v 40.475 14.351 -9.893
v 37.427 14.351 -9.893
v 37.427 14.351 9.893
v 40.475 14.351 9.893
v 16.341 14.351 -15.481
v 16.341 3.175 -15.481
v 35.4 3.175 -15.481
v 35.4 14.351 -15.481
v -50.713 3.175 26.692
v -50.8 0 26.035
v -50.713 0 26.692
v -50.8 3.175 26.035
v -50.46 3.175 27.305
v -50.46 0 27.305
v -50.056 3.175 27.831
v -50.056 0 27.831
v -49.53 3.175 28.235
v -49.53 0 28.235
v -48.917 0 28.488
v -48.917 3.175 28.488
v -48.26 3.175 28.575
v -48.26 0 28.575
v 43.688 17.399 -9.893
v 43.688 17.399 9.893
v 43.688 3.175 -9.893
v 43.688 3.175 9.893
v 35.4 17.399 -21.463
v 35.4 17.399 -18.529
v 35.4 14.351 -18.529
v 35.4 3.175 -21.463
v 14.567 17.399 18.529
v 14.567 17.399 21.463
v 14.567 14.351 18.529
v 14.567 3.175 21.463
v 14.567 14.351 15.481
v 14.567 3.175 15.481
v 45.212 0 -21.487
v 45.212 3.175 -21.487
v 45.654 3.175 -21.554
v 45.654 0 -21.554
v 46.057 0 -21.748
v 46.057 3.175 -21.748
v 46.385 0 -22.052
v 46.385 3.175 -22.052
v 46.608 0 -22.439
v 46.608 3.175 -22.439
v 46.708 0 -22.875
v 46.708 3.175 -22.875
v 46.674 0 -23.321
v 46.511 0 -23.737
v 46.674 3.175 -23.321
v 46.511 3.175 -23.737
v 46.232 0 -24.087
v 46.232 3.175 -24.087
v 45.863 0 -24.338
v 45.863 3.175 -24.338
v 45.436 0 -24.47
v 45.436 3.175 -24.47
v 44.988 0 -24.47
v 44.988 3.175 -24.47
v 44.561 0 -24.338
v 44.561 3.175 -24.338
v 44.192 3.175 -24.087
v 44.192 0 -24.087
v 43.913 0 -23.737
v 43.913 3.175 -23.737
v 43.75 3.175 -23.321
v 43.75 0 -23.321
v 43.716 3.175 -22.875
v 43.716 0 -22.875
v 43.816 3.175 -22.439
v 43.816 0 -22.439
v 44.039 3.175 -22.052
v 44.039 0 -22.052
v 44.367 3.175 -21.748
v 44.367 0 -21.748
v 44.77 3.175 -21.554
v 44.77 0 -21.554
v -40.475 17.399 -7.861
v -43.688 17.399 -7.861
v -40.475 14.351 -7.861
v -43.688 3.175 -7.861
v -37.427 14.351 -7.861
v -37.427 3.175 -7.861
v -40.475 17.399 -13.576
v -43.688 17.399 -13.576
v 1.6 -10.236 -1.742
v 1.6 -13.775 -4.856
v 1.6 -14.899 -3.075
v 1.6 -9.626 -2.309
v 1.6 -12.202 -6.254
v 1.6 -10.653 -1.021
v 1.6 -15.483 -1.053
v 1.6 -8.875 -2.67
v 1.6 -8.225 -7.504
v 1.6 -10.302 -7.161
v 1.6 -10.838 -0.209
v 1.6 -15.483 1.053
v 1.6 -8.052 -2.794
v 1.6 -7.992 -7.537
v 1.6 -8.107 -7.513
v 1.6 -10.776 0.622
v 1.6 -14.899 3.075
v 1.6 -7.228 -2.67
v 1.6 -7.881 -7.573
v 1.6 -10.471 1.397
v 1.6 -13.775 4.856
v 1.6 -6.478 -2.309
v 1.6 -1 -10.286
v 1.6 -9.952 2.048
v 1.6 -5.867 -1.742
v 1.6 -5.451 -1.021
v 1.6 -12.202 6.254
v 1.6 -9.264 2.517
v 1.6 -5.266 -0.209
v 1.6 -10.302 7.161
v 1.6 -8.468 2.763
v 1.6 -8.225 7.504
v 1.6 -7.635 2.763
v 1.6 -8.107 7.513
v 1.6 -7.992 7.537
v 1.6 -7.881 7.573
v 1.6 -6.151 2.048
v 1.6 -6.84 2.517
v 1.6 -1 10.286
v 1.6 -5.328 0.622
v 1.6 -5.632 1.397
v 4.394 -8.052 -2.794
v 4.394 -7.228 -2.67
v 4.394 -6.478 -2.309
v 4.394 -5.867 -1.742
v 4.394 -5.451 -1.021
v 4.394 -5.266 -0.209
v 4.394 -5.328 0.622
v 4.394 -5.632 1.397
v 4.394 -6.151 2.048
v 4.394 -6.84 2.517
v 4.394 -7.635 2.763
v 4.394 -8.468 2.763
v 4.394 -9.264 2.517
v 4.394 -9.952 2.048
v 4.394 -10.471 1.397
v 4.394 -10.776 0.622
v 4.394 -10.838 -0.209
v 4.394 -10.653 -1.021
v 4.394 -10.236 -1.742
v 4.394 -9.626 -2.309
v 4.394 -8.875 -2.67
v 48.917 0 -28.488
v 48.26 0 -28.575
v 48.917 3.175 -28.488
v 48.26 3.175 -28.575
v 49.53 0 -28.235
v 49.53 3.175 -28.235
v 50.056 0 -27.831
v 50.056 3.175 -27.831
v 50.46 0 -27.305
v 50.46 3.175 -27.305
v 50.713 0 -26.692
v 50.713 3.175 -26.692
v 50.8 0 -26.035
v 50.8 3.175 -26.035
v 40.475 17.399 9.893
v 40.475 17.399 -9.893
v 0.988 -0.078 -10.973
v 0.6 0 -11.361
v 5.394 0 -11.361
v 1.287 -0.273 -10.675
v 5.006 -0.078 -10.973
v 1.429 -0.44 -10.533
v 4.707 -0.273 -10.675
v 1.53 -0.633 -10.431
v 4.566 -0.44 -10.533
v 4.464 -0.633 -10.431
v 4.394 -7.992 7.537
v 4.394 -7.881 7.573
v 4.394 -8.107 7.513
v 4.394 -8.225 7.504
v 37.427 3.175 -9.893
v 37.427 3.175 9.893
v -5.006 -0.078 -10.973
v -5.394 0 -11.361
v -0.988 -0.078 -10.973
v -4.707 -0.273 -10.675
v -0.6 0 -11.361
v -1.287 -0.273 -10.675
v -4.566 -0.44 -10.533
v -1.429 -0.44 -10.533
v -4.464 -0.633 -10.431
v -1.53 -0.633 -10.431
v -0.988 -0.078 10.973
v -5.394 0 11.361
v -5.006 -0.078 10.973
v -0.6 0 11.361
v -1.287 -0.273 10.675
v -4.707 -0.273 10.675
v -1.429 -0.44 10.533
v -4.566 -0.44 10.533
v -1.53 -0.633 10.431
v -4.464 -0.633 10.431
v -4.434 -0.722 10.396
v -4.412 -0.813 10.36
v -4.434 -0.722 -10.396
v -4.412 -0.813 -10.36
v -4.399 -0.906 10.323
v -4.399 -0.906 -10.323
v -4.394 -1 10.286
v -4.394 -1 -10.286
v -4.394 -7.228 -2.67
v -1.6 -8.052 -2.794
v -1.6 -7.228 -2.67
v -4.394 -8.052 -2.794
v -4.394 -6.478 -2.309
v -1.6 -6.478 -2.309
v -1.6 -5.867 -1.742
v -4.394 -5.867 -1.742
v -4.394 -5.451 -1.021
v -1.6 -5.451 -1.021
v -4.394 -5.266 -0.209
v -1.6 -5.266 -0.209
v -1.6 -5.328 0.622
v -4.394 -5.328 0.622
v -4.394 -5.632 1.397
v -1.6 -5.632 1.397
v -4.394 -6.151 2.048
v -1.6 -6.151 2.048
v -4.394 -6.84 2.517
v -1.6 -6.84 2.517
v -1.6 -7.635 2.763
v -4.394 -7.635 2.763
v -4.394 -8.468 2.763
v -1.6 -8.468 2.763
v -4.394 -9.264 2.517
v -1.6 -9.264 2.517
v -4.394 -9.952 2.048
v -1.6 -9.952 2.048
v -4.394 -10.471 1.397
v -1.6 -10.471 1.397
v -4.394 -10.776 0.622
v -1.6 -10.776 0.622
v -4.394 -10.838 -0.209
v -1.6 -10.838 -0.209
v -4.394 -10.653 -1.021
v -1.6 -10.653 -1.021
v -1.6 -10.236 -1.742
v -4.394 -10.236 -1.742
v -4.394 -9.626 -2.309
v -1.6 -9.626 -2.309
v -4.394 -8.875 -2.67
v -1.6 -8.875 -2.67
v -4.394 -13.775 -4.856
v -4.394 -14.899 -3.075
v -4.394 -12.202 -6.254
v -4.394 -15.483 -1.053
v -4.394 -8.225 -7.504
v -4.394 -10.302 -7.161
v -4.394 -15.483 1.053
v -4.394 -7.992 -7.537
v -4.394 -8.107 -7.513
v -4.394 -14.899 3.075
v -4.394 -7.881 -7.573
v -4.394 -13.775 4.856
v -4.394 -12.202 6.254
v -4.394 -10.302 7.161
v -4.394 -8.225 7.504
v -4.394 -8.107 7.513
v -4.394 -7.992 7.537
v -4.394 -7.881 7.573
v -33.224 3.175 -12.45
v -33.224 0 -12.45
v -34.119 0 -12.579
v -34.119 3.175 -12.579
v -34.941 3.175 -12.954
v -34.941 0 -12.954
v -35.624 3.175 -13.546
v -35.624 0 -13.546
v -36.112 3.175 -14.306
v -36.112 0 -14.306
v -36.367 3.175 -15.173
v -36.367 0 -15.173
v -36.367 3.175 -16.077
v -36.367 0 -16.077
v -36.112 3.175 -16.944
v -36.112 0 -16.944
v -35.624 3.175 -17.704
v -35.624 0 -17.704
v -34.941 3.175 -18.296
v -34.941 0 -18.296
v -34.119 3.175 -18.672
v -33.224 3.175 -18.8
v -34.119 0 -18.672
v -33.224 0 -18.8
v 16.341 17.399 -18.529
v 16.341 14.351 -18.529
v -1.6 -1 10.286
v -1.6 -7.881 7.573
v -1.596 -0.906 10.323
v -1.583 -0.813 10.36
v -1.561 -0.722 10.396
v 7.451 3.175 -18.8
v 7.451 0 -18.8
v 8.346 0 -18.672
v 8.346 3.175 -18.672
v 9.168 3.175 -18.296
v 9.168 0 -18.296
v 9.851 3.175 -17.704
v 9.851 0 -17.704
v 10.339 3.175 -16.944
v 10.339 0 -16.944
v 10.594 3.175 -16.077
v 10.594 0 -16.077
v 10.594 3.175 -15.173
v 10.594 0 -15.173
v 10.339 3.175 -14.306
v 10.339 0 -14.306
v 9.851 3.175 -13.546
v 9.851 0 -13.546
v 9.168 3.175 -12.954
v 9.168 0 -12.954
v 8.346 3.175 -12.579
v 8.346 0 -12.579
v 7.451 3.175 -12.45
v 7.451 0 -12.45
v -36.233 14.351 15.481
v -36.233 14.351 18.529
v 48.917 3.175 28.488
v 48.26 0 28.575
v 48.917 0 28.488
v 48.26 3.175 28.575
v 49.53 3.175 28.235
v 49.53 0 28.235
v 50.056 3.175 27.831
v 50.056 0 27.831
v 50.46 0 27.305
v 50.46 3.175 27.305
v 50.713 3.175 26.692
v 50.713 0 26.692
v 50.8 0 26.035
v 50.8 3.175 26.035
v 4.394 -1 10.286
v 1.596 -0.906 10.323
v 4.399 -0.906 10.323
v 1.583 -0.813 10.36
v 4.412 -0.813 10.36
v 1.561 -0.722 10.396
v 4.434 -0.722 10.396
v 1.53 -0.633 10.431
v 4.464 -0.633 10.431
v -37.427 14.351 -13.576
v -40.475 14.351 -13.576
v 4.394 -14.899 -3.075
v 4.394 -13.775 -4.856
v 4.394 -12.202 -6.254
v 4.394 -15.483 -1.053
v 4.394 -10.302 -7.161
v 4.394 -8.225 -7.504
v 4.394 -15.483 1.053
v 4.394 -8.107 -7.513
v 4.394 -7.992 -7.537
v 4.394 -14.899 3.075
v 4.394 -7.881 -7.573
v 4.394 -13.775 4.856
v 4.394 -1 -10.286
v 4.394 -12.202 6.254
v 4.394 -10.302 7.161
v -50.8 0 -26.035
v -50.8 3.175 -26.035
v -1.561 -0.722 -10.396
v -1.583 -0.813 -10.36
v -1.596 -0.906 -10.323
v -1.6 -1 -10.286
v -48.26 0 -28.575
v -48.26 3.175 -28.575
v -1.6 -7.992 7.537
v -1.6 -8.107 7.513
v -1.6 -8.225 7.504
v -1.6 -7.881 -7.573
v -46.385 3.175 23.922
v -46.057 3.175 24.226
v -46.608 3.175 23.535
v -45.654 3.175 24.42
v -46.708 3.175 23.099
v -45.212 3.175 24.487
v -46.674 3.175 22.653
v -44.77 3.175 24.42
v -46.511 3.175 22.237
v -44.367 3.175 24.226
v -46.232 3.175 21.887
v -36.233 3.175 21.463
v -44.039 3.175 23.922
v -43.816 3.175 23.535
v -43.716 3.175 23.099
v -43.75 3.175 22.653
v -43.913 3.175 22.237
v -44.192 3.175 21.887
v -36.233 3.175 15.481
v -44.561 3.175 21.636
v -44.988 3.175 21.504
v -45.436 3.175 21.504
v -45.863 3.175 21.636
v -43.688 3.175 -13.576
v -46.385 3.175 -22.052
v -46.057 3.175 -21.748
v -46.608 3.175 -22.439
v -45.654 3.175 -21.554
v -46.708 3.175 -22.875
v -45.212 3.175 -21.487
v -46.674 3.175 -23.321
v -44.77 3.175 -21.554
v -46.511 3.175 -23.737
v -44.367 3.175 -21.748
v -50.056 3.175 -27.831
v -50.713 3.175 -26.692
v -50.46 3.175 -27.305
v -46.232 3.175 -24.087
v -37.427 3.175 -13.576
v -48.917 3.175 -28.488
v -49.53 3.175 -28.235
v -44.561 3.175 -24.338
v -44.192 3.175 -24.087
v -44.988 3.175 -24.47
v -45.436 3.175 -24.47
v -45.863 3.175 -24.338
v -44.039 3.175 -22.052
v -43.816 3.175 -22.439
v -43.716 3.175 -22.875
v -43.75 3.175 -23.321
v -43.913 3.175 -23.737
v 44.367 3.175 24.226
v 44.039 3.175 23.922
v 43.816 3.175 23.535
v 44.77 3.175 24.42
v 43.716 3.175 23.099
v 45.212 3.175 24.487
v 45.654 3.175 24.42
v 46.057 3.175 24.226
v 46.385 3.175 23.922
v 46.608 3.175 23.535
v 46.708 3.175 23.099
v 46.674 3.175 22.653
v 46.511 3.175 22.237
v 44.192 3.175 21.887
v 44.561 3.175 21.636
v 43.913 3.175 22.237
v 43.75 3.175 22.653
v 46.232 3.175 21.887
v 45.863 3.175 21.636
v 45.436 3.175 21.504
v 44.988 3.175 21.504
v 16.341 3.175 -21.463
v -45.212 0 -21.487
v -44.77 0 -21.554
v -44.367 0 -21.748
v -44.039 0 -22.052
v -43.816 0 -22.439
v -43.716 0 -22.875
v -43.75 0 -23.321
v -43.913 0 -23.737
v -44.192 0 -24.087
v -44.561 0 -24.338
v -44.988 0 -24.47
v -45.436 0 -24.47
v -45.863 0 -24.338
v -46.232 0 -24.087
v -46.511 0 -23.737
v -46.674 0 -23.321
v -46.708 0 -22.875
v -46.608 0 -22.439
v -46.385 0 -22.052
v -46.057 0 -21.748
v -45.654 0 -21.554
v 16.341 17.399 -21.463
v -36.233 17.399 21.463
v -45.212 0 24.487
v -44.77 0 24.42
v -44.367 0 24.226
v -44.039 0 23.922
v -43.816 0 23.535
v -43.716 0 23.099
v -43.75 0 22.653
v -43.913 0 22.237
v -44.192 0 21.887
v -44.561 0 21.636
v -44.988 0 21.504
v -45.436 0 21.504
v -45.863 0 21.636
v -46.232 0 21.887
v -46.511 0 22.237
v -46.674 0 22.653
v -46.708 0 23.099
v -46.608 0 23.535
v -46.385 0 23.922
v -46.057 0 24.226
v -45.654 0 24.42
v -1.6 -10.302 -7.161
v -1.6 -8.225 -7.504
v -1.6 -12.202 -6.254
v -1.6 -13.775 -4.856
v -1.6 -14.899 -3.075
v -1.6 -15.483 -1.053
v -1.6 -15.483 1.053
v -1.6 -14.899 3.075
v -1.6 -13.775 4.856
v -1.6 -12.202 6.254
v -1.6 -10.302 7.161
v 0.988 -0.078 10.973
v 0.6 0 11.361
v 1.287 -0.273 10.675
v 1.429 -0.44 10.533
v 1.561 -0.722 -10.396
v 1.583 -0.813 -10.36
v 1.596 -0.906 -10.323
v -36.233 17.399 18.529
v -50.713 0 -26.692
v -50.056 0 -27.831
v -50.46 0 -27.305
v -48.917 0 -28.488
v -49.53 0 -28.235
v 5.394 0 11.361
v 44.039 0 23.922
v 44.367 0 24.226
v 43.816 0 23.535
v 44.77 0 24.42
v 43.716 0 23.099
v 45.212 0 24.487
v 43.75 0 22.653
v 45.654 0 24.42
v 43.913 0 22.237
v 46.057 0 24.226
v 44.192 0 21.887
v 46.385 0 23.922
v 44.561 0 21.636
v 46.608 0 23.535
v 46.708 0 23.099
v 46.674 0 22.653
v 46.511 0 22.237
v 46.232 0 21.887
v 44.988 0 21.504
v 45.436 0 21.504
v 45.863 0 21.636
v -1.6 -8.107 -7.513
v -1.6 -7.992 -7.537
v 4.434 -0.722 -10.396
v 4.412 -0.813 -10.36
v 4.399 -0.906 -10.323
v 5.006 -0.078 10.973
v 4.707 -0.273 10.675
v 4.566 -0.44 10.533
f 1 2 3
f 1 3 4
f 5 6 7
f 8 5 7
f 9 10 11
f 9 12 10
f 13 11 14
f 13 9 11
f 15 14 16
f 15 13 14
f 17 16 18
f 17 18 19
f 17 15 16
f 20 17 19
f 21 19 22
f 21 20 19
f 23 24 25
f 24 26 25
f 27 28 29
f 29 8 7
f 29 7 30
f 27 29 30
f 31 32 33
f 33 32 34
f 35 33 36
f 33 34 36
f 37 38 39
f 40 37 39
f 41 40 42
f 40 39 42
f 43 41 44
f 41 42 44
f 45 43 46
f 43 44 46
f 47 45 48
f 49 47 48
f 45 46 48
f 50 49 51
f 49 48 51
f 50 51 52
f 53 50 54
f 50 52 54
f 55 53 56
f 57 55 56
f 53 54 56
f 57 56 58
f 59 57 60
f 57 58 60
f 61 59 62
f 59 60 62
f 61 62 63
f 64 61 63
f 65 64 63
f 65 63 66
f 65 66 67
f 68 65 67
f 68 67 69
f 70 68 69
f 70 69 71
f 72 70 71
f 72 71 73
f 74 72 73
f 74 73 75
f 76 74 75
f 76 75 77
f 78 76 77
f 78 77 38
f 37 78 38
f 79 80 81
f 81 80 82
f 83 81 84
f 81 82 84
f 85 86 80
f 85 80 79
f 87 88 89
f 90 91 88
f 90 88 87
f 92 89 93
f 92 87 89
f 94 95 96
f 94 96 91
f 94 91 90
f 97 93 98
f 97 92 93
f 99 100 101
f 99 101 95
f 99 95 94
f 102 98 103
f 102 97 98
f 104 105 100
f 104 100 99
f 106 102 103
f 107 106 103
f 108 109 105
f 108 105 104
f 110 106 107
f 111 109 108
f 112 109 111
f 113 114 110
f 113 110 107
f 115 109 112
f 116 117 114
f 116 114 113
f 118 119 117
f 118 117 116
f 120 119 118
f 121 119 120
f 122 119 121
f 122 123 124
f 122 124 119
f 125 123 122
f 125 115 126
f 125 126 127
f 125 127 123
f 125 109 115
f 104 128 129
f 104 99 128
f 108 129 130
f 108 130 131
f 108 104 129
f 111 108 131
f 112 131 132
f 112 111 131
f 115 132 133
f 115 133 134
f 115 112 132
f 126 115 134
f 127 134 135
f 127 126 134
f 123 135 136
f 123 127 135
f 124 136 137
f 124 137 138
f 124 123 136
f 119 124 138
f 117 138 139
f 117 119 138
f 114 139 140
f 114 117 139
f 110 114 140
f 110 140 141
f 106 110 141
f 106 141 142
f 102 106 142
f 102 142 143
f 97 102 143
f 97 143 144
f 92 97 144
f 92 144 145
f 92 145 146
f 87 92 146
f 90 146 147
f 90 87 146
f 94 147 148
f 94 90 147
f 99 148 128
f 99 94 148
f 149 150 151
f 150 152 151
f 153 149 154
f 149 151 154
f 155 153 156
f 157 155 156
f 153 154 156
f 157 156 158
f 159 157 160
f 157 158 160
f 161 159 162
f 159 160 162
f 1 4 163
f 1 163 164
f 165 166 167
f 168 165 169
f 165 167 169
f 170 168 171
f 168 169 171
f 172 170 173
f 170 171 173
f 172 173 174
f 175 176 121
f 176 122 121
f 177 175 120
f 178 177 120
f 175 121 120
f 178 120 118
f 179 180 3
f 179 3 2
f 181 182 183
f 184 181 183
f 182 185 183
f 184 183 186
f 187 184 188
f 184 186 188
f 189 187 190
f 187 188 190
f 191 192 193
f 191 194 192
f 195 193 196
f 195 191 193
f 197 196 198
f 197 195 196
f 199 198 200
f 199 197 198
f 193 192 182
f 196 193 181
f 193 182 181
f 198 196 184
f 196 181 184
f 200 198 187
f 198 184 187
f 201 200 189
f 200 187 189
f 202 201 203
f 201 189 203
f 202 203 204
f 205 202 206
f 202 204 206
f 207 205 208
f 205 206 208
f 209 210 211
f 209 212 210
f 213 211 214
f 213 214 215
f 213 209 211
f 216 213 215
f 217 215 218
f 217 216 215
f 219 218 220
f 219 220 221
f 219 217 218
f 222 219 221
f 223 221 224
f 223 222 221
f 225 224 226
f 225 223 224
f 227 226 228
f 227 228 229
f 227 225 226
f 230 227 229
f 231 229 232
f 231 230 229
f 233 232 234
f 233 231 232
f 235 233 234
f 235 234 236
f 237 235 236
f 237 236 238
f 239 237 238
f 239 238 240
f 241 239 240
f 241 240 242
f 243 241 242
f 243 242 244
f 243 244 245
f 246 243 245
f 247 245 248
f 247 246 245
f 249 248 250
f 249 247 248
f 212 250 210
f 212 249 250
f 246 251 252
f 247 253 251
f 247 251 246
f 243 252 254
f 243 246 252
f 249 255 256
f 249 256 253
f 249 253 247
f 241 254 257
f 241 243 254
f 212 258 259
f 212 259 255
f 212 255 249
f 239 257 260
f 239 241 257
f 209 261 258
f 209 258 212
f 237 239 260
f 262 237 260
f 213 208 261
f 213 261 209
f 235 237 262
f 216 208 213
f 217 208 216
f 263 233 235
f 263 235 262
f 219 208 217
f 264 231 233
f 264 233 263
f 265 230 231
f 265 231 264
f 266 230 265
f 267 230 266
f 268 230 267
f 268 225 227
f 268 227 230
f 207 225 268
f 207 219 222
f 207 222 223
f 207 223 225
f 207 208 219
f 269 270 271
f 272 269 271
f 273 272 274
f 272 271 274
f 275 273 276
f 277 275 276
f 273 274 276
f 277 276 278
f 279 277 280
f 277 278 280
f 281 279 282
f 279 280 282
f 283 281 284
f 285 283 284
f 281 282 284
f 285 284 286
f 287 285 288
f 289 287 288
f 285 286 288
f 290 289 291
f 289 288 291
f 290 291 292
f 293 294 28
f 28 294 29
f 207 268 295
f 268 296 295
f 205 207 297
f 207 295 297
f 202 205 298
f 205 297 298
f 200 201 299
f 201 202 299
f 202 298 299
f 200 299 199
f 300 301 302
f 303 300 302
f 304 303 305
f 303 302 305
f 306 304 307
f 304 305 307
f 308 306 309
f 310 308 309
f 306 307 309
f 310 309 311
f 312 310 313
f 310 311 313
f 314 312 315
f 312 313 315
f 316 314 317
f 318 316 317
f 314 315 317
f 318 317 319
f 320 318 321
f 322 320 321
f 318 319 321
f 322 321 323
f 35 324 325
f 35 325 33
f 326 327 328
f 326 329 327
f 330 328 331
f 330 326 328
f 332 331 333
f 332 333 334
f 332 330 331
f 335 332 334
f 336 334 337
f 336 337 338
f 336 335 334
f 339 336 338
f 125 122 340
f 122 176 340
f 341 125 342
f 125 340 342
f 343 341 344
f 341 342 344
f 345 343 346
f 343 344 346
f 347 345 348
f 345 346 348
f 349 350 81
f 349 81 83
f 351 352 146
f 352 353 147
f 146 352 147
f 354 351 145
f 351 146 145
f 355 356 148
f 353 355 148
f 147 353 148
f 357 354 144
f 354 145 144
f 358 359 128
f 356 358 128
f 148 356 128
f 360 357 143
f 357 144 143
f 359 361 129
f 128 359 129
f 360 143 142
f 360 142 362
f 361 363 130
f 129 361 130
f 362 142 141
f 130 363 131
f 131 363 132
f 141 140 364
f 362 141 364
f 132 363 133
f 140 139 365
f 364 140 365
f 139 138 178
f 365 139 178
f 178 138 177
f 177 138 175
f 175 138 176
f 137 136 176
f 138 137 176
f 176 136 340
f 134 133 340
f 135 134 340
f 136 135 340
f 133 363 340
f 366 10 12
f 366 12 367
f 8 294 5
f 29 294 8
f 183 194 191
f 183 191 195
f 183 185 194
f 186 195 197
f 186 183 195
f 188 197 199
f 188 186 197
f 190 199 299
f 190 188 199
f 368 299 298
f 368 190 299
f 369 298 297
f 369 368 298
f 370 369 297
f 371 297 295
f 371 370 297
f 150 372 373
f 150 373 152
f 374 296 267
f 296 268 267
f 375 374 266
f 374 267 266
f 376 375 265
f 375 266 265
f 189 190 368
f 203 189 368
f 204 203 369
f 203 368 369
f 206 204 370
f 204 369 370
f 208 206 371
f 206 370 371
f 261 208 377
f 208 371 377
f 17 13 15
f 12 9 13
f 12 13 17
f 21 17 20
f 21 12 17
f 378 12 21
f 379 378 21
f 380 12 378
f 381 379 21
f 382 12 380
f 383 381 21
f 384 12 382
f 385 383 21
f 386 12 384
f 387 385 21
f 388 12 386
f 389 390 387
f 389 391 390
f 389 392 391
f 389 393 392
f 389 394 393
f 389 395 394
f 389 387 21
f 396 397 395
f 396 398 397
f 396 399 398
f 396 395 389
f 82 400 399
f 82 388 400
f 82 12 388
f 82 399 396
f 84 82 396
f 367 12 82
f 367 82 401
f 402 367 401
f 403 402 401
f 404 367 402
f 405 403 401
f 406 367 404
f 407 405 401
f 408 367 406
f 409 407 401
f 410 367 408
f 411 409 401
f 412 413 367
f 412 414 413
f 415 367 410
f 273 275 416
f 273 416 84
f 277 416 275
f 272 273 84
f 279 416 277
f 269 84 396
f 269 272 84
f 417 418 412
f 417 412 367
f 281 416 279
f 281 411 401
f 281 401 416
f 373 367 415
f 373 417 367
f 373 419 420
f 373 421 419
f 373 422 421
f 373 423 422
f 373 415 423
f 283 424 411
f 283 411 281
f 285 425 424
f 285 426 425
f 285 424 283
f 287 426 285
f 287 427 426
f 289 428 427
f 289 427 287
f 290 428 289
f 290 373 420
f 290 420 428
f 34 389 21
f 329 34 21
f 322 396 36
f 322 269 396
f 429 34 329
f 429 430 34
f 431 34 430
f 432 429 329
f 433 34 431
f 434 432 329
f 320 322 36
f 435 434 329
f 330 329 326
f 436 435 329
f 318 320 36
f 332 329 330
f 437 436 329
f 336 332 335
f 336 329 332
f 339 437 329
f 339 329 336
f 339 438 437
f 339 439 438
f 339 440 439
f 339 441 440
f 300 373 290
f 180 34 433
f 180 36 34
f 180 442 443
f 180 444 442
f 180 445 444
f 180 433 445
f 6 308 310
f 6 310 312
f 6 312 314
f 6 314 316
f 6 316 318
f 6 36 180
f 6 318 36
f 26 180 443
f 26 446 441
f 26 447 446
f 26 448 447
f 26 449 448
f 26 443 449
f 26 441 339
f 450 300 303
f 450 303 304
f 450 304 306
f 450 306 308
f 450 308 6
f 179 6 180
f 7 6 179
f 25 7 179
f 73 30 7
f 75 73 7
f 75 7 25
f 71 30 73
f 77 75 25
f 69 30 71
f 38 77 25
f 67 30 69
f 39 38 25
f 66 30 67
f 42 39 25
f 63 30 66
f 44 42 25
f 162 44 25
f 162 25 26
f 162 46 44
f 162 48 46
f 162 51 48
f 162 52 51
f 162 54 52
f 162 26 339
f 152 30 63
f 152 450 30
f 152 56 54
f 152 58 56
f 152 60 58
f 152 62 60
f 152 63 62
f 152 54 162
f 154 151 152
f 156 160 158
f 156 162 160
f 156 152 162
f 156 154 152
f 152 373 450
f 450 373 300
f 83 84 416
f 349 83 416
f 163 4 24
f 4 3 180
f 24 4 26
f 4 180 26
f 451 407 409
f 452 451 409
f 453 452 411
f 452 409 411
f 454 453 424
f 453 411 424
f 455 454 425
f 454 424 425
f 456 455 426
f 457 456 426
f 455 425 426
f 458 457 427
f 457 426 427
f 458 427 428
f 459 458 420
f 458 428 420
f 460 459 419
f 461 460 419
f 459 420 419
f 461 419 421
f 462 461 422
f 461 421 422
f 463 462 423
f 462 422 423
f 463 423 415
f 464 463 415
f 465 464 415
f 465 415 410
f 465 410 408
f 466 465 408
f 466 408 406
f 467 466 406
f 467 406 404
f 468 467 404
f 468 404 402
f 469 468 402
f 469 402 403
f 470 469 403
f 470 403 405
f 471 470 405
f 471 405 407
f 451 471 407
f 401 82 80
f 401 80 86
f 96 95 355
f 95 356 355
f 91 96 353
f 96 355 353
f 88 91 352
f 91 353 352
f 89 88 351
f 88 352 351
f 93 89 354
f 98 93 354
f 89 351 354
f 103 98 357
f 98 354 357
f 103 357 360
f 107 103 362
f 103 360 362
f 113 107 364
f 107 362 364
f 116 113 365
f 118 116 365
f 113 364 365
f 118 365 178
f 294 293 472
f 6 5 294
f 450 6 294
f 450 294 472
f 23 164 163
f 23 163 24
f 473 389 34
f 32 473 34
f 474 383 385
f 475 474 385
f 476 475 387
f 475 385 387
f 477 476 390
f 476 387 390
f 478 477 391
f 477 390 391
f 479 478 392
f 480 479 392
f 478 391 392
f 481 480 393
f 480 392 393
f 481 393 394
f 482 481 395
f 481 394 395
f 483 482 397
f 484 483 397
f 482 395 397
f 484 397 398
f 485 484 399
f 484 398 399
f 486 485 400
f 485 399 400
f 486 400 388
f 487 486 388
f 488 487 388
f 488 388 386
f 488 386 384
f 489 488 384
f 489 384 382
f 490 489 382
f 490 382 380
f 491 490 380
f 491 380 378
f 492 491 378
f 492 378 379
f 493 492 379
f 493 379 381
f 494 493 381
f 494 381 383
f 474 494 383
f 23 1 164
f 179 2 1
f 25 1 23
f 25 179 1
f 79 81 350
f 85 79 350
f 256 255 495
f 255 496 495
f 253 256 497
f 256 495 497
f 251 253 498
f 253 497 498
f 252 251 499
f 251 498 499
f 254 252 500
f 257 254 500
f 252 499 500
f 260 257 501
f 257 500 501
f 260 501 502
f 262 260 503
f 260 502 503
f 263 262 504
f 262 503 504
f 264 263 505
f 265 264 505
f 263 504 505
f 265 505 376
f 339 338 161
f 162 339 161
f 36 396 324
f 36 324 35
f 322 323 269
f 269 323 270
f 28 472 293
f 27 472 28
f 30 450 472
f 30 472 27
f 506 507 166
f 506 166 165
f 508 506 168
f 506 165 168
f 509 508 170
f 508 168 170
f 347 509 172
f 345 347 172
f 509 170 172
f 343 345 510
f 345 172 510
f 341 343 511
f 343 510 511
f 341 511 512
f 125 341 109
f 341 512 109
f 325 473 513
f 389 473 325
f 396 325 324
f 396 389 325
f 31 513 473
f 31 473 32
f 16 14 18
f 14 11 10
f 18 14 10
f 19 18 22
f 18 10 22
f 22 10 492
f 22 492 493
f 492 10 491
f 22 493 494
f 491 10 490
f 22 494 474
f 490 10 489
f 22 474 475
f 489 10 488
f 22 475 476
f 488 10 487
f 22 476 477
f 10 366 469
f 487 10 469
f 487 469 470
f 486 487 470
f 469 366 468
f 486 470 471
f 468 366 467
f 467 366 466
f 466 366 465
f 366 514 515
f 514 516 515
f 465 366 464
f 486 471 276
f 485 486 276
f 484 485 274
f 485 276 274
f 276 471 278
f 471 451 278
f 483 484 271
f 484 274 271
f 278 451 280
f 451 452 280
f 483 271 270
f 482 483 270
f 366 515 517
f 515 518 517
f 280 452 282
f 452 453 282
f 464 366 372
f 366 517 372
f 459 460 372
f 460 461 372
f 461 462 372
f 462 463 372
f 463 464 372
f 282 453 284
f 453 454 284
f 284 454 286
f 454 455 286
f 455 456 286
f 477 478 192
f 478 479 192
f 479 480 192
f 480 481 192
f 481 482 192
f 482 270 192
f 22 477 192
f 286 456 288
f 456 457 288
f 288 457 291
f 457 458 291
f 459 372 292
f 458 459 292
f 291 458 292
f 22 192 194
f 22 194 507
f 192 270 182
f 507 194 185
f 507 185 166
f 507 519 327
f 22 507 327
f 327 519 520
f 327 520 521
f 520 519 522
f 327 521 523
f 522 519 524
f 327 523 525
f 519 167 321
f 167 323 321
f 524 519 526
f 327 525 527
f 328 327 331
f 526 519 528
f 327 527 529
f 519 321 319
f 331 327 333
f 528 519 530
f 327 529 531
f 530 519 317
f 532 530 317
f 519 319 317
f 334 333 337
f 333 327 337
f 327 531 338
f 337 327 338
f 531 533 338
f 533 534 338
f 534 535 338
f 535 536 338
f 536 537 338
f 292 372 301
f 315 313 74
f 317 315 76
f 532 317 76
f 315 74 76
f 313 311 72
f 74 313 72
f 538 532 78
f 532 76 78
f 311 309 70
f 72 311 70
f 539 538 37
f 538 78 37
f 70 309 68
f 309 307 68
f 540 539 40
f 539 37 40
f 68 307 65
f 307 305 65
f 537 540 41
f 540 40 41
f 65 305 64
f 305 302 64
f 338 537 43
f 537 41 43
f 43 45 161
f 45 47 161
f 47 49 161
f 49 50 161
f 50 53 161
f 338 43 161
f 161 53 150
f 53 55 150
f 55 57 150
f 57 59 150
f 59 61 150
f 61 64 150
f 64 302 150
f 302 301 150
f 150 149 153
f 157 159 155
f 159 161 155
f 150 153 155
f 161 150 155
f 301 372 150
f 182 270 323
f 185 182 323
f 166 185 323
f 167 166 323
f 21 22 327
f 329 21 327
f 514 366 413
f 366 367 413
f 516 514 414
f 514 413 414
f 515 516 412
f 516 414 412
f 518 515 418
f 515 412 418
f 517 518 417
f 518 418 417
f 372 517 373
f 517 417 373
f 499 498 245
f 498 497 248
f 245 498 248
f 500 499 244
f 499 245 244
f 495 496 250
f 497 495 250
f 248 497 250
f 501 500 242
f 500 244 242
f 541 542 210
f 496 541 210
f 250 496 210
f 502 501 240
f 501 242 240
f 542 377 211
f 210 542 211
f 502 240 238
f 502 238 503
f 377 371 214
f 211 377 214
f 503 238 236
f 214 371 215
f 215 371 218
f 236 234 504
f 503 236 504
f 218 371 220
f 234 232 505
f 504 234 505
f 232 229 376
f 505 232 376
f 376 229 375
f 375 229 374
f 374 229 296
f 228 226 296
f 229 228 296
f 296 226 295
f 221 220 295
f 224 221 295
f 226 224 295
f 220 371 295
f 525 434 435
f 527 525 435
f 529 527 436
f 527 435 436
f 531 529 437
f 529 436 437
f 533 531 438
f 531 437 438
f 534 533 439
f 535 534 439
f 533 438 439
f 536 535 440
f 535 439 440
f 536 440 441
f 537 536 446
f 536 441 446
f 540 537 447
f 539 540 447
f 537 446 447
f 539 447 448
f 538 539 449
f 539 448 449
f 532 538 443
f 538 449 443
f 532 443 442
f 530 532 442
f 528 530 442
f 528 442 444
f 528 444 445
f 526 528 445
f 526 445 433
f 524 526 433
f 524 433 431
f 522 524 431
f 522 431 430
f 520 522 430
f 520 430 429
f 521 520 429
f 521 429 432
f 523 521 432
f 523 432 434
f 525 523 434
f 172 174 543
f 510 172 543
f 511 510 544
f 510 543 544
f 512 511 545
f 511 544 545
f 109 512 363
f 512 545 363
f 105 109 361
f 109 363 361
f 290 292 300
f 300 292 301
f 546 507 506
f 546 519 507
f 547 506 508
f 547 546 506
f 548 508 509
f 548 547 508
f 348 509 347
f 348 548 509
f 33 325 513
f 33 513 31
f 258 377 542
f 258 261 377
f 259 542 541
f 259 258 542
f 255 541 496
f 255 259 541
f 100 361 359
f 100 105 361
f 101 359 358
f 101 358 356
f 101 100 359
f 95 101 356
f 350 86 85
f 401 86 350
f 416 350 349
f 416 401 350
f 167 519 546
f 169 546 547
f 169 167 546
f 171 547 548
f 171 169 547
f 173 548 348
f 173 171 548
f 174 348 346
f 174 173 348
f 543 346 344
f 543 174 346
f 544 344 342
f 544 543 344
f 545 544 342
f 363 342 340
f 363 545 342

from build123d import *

# Parameters (mm, degrees)
SKETCH1_W               = 101.6
SKETCH1_H               = 57.15
BOSS_EXTRUDE1_DEPTH     = 3.175
SKETCH10_R              = 1.5
CUT_EXTRUDE3_DEPTH      = 59.371664787
FILLET1_R               = 2.54
CUT_EXTRUDE4_DEPTH      = 59.371664787
CUT_EXTRUDE4_DEPTH_BACK = 59.371664787
SKETCH12_R              = 2.794
BOSS_EXTRUDE3_DEPTH     = 1.397
SKETCH13_R              = 2.794
BOSS_EXTRUDE4_DEPTH     = 1.397
FILLET4_R               = 1
SKETCH14_W              = 50.8
SKETCH14_H              = 5.9817
SKETCH14_W_2            = 19.058479039
SKETCH14_W_3            = 6.2611
SKETCH14_H_2            = 19.7866
SKETCH14_H_3            = 5.715
BOSS_EXTRUDE5_DEPTH     = 11.176
SKETCH15_W              = 3.2131
SKETCH15_H              = 19.7866
SKETCH15_W_2            = 19.058479039
SKETCH15_H_2            = 2.9337
SKETCH15_H_3            = 5.715
SKETCH15_W_3            = 50.8
BOSS_EXTRUDE6_DEPTH     = 3.048


with BuildPart() as part:
    # Sketch1 → Boss-Extrude1 (new body)
    with BuildSketch(Plane(origin=(0, 0, 0), x_dir=(1, 0, 0), z_dir=(0, 1, 0))):
        Rectangle(SKETCH1_W, SKETCH1_H)
    extrude(amount=BOSS_EXTRUDE1_DEPTH)

    # Sketch10 → Cut-Extrude3 (cut, through all)
    with BuildSketch(Plane(origin=(0, 3.175, 0), x_dir=(1, 0, 0), z_dir=(0, 1, 0))):
        with Locations(Location((-45.212, -22.987, 0), (0, 0, 270))):
            Circle(SKETCH10_R)
        with Locations(Location((45.212, 22.987, 0), (0, 0, 270))):
            Circle(SKETCH10_R)
        with Locations(Location((-45.212, 22.987, 0), (0, 0, 270))):
            Circle(SKETCH10_R)
        with Locations(Location((45.212, -22.987, 0), (0, 0, 270))):
            Circle(SKETCH10_R)
    extrude(amount=-CUT_EXTRUDE3_DEPTH, mode=Mode.SUBTRACT)

    # Fillet1
    fillet1_edges = [part.edges().sort_by_distance(p)[0] for p in [
        (-50.8, 1.5875, -28.575),
        (50.8, 1.5875, -28.575),
        (50.8, 1.5875, 28.575),
        (-50.8, 1.5875, 28.575),
    ]]
    fillet(fillet1_edges, radius=FILLET1_R)

    # Sketch11 → Cut-Extrude4 (cut, two sides: drawn at the far end of the back side and taken through both)
    with BuildSketch(Plane(origin=(0, 3.175, 0), x_dir=(1, 0, 0), z_dir=(0, 1, 0)).offset(-CUT_EXTRUDE4_DEPTH_BACK)):
        with BuildLine():
            Line((-33.224345588, 18.800272814), (7.451171928, 18.800272814))
            ThreePointArc((7.451171928, 18.800272814), (10.626171928, 15.625272814), (7.451171928, 12.450272814))
            Line((7.451171928, 12.450272814), (-33.224345588, 12.450272814))
            ThreePointArc((-33.224345588, 12.450272814), (-36.399345588, 15.625272814), (-33.224345588, 18.800272814))
        make_face()
    extrude(amount=CUT_EXTRUDE4_DEPTH + CUT_EXTRUDE4_DEPTH_BACK, mode=Mode.SUBTRACT)

    # Sketch12 → Boss-Extrude3 (add, symmetric)
    with BuildSketch(Plane(origin=(2.9972, 0, 0), x_dir=(0, 0, -1), z_dir=(1, 0, 0))):
        with BuildLine():
            Line((-7.5057, 0), (7.5057, 0))
            Line((7.5057, 0), (10.6807, 0))
            Line((10.6807, 0), (7.5057, -8.0518))
            ThreePointArc((7.5057, -8.0518), (0, -15.5575), (-7.5057, -8.0518))
            Line((-7.5057, -8.0518), (-10.6807, 0))
            Line((-10.6807, 0), (-7.5057, 0))
        make_face()
        with Locations((0, -8.0518)):
            Circle(SKETCH12_R, mode=Mode.SUBTRACT)
    extrude(amount=BOSS_EXTRUDE3_DEPTH, both=True)

    # Sketch13 → Boss-Extrude4 (add, symmetric)
    with BuildSketch(Plane(origin=(-2.9972, 0, 0), x_dir=(0, 0, -1), z_dir=(1, 0, 0))):
        with BuildLine():
            Line((-7.5057, 0), (7.5057, 0))
            Line((7.5057, 0), (10.6807, 0))
            Line((10.6807, 0), (7.5057, -8.0518))
            ThreePointArc((7.5057, -8.0518), (0, -15.5575), (-7.5057, -8.0518))
            Line((-7.5057, -8.0518), (-10.6807, 0))
            Line((-10.6807, 0), (-7.5057, 0))
        make_face()
        with Locations((0, -8.0518)):
            Circle(SKETCH13_R, mode=Mode.SUBTRACT)
    extrude(amount=BOSS_EXTRUDE4_DEPTH, both=True)

    # Fillet4
    fillet4_edges = [part.edges().sort_by_distance(p)[0] for p in [
        (4.3942, 0, 0),
        (2.9972, -8.0518, 7.5057),
        (2.9972, -8.0518, -7.5057),
        (1.6002, 0, 0),
        (2.9972, 0, -10.6807),
        (2.9972, 0, 10.6807),
        (-1.6002, 0, 0),
        (-2.9972, 0, 10.6807),
        (-2.9972, -8.0518, 7.5057),
        (-2.9972, -8.0518, -7.5057),
        (-4.3942, 0, 0),
        (-2.9972, 0, -10.6807),
    ]]
    fillet(fillet4_edges, radius=FILLET4_R)

    # Sketch14 → Boss-Extrude5 (add)
    with BuildSketch(Plane(origin=(0, 3.175, 0), x_dir=(1, 0, 0), z_dir=(0, 1, 0))):
        with Locations((-10.8331, -18.47215)):
            Rectangle(SKETCH14_W, SKETCH14_H)
        with Locations((25.870411448, 18.47215)):
            Rectangle(SKETCH14_W_2, SKETCH14_H)
        with Locations((40.55745, 0)):
            Rectangle(SKETCH14_W_3, SKETCH14_H_2)
        with Locations((-40.55745, 10.7188)):
            Rectangle(SKETCH14_W_3, SKETCH14_H_3)
    extrude(amount=BOSS_EXTRUDE5_DEPTH)

    # Sketch15 → Boss-Extrude6 (add)
    with BuildSketch(Plane(origin=(0, 14.351, 0), x_dir=(1, 0, 0), z_dir=(0, 1, 0))):
        with Locations((42.08145, 0)):
            Rectangle(SKETCH15_W, SKETCH15_H)
        with Locations((25.870411448, 19.99615)):
            Rectangle(SKETCH15_W_2, SKETCH15_H_2)
        with Locations((-42.08145, 10.7188)):
            Rectangle(SKETCH15_W, SKETCH15_H_3)
        with Locations((-10.8331, -19.99615)):
            Rectangle(SKETCH15_W_3, SKETCH15_H_2)
    extrude(amount=BOSS_EXTRUDE6_DEPTH)


solid = part.part
